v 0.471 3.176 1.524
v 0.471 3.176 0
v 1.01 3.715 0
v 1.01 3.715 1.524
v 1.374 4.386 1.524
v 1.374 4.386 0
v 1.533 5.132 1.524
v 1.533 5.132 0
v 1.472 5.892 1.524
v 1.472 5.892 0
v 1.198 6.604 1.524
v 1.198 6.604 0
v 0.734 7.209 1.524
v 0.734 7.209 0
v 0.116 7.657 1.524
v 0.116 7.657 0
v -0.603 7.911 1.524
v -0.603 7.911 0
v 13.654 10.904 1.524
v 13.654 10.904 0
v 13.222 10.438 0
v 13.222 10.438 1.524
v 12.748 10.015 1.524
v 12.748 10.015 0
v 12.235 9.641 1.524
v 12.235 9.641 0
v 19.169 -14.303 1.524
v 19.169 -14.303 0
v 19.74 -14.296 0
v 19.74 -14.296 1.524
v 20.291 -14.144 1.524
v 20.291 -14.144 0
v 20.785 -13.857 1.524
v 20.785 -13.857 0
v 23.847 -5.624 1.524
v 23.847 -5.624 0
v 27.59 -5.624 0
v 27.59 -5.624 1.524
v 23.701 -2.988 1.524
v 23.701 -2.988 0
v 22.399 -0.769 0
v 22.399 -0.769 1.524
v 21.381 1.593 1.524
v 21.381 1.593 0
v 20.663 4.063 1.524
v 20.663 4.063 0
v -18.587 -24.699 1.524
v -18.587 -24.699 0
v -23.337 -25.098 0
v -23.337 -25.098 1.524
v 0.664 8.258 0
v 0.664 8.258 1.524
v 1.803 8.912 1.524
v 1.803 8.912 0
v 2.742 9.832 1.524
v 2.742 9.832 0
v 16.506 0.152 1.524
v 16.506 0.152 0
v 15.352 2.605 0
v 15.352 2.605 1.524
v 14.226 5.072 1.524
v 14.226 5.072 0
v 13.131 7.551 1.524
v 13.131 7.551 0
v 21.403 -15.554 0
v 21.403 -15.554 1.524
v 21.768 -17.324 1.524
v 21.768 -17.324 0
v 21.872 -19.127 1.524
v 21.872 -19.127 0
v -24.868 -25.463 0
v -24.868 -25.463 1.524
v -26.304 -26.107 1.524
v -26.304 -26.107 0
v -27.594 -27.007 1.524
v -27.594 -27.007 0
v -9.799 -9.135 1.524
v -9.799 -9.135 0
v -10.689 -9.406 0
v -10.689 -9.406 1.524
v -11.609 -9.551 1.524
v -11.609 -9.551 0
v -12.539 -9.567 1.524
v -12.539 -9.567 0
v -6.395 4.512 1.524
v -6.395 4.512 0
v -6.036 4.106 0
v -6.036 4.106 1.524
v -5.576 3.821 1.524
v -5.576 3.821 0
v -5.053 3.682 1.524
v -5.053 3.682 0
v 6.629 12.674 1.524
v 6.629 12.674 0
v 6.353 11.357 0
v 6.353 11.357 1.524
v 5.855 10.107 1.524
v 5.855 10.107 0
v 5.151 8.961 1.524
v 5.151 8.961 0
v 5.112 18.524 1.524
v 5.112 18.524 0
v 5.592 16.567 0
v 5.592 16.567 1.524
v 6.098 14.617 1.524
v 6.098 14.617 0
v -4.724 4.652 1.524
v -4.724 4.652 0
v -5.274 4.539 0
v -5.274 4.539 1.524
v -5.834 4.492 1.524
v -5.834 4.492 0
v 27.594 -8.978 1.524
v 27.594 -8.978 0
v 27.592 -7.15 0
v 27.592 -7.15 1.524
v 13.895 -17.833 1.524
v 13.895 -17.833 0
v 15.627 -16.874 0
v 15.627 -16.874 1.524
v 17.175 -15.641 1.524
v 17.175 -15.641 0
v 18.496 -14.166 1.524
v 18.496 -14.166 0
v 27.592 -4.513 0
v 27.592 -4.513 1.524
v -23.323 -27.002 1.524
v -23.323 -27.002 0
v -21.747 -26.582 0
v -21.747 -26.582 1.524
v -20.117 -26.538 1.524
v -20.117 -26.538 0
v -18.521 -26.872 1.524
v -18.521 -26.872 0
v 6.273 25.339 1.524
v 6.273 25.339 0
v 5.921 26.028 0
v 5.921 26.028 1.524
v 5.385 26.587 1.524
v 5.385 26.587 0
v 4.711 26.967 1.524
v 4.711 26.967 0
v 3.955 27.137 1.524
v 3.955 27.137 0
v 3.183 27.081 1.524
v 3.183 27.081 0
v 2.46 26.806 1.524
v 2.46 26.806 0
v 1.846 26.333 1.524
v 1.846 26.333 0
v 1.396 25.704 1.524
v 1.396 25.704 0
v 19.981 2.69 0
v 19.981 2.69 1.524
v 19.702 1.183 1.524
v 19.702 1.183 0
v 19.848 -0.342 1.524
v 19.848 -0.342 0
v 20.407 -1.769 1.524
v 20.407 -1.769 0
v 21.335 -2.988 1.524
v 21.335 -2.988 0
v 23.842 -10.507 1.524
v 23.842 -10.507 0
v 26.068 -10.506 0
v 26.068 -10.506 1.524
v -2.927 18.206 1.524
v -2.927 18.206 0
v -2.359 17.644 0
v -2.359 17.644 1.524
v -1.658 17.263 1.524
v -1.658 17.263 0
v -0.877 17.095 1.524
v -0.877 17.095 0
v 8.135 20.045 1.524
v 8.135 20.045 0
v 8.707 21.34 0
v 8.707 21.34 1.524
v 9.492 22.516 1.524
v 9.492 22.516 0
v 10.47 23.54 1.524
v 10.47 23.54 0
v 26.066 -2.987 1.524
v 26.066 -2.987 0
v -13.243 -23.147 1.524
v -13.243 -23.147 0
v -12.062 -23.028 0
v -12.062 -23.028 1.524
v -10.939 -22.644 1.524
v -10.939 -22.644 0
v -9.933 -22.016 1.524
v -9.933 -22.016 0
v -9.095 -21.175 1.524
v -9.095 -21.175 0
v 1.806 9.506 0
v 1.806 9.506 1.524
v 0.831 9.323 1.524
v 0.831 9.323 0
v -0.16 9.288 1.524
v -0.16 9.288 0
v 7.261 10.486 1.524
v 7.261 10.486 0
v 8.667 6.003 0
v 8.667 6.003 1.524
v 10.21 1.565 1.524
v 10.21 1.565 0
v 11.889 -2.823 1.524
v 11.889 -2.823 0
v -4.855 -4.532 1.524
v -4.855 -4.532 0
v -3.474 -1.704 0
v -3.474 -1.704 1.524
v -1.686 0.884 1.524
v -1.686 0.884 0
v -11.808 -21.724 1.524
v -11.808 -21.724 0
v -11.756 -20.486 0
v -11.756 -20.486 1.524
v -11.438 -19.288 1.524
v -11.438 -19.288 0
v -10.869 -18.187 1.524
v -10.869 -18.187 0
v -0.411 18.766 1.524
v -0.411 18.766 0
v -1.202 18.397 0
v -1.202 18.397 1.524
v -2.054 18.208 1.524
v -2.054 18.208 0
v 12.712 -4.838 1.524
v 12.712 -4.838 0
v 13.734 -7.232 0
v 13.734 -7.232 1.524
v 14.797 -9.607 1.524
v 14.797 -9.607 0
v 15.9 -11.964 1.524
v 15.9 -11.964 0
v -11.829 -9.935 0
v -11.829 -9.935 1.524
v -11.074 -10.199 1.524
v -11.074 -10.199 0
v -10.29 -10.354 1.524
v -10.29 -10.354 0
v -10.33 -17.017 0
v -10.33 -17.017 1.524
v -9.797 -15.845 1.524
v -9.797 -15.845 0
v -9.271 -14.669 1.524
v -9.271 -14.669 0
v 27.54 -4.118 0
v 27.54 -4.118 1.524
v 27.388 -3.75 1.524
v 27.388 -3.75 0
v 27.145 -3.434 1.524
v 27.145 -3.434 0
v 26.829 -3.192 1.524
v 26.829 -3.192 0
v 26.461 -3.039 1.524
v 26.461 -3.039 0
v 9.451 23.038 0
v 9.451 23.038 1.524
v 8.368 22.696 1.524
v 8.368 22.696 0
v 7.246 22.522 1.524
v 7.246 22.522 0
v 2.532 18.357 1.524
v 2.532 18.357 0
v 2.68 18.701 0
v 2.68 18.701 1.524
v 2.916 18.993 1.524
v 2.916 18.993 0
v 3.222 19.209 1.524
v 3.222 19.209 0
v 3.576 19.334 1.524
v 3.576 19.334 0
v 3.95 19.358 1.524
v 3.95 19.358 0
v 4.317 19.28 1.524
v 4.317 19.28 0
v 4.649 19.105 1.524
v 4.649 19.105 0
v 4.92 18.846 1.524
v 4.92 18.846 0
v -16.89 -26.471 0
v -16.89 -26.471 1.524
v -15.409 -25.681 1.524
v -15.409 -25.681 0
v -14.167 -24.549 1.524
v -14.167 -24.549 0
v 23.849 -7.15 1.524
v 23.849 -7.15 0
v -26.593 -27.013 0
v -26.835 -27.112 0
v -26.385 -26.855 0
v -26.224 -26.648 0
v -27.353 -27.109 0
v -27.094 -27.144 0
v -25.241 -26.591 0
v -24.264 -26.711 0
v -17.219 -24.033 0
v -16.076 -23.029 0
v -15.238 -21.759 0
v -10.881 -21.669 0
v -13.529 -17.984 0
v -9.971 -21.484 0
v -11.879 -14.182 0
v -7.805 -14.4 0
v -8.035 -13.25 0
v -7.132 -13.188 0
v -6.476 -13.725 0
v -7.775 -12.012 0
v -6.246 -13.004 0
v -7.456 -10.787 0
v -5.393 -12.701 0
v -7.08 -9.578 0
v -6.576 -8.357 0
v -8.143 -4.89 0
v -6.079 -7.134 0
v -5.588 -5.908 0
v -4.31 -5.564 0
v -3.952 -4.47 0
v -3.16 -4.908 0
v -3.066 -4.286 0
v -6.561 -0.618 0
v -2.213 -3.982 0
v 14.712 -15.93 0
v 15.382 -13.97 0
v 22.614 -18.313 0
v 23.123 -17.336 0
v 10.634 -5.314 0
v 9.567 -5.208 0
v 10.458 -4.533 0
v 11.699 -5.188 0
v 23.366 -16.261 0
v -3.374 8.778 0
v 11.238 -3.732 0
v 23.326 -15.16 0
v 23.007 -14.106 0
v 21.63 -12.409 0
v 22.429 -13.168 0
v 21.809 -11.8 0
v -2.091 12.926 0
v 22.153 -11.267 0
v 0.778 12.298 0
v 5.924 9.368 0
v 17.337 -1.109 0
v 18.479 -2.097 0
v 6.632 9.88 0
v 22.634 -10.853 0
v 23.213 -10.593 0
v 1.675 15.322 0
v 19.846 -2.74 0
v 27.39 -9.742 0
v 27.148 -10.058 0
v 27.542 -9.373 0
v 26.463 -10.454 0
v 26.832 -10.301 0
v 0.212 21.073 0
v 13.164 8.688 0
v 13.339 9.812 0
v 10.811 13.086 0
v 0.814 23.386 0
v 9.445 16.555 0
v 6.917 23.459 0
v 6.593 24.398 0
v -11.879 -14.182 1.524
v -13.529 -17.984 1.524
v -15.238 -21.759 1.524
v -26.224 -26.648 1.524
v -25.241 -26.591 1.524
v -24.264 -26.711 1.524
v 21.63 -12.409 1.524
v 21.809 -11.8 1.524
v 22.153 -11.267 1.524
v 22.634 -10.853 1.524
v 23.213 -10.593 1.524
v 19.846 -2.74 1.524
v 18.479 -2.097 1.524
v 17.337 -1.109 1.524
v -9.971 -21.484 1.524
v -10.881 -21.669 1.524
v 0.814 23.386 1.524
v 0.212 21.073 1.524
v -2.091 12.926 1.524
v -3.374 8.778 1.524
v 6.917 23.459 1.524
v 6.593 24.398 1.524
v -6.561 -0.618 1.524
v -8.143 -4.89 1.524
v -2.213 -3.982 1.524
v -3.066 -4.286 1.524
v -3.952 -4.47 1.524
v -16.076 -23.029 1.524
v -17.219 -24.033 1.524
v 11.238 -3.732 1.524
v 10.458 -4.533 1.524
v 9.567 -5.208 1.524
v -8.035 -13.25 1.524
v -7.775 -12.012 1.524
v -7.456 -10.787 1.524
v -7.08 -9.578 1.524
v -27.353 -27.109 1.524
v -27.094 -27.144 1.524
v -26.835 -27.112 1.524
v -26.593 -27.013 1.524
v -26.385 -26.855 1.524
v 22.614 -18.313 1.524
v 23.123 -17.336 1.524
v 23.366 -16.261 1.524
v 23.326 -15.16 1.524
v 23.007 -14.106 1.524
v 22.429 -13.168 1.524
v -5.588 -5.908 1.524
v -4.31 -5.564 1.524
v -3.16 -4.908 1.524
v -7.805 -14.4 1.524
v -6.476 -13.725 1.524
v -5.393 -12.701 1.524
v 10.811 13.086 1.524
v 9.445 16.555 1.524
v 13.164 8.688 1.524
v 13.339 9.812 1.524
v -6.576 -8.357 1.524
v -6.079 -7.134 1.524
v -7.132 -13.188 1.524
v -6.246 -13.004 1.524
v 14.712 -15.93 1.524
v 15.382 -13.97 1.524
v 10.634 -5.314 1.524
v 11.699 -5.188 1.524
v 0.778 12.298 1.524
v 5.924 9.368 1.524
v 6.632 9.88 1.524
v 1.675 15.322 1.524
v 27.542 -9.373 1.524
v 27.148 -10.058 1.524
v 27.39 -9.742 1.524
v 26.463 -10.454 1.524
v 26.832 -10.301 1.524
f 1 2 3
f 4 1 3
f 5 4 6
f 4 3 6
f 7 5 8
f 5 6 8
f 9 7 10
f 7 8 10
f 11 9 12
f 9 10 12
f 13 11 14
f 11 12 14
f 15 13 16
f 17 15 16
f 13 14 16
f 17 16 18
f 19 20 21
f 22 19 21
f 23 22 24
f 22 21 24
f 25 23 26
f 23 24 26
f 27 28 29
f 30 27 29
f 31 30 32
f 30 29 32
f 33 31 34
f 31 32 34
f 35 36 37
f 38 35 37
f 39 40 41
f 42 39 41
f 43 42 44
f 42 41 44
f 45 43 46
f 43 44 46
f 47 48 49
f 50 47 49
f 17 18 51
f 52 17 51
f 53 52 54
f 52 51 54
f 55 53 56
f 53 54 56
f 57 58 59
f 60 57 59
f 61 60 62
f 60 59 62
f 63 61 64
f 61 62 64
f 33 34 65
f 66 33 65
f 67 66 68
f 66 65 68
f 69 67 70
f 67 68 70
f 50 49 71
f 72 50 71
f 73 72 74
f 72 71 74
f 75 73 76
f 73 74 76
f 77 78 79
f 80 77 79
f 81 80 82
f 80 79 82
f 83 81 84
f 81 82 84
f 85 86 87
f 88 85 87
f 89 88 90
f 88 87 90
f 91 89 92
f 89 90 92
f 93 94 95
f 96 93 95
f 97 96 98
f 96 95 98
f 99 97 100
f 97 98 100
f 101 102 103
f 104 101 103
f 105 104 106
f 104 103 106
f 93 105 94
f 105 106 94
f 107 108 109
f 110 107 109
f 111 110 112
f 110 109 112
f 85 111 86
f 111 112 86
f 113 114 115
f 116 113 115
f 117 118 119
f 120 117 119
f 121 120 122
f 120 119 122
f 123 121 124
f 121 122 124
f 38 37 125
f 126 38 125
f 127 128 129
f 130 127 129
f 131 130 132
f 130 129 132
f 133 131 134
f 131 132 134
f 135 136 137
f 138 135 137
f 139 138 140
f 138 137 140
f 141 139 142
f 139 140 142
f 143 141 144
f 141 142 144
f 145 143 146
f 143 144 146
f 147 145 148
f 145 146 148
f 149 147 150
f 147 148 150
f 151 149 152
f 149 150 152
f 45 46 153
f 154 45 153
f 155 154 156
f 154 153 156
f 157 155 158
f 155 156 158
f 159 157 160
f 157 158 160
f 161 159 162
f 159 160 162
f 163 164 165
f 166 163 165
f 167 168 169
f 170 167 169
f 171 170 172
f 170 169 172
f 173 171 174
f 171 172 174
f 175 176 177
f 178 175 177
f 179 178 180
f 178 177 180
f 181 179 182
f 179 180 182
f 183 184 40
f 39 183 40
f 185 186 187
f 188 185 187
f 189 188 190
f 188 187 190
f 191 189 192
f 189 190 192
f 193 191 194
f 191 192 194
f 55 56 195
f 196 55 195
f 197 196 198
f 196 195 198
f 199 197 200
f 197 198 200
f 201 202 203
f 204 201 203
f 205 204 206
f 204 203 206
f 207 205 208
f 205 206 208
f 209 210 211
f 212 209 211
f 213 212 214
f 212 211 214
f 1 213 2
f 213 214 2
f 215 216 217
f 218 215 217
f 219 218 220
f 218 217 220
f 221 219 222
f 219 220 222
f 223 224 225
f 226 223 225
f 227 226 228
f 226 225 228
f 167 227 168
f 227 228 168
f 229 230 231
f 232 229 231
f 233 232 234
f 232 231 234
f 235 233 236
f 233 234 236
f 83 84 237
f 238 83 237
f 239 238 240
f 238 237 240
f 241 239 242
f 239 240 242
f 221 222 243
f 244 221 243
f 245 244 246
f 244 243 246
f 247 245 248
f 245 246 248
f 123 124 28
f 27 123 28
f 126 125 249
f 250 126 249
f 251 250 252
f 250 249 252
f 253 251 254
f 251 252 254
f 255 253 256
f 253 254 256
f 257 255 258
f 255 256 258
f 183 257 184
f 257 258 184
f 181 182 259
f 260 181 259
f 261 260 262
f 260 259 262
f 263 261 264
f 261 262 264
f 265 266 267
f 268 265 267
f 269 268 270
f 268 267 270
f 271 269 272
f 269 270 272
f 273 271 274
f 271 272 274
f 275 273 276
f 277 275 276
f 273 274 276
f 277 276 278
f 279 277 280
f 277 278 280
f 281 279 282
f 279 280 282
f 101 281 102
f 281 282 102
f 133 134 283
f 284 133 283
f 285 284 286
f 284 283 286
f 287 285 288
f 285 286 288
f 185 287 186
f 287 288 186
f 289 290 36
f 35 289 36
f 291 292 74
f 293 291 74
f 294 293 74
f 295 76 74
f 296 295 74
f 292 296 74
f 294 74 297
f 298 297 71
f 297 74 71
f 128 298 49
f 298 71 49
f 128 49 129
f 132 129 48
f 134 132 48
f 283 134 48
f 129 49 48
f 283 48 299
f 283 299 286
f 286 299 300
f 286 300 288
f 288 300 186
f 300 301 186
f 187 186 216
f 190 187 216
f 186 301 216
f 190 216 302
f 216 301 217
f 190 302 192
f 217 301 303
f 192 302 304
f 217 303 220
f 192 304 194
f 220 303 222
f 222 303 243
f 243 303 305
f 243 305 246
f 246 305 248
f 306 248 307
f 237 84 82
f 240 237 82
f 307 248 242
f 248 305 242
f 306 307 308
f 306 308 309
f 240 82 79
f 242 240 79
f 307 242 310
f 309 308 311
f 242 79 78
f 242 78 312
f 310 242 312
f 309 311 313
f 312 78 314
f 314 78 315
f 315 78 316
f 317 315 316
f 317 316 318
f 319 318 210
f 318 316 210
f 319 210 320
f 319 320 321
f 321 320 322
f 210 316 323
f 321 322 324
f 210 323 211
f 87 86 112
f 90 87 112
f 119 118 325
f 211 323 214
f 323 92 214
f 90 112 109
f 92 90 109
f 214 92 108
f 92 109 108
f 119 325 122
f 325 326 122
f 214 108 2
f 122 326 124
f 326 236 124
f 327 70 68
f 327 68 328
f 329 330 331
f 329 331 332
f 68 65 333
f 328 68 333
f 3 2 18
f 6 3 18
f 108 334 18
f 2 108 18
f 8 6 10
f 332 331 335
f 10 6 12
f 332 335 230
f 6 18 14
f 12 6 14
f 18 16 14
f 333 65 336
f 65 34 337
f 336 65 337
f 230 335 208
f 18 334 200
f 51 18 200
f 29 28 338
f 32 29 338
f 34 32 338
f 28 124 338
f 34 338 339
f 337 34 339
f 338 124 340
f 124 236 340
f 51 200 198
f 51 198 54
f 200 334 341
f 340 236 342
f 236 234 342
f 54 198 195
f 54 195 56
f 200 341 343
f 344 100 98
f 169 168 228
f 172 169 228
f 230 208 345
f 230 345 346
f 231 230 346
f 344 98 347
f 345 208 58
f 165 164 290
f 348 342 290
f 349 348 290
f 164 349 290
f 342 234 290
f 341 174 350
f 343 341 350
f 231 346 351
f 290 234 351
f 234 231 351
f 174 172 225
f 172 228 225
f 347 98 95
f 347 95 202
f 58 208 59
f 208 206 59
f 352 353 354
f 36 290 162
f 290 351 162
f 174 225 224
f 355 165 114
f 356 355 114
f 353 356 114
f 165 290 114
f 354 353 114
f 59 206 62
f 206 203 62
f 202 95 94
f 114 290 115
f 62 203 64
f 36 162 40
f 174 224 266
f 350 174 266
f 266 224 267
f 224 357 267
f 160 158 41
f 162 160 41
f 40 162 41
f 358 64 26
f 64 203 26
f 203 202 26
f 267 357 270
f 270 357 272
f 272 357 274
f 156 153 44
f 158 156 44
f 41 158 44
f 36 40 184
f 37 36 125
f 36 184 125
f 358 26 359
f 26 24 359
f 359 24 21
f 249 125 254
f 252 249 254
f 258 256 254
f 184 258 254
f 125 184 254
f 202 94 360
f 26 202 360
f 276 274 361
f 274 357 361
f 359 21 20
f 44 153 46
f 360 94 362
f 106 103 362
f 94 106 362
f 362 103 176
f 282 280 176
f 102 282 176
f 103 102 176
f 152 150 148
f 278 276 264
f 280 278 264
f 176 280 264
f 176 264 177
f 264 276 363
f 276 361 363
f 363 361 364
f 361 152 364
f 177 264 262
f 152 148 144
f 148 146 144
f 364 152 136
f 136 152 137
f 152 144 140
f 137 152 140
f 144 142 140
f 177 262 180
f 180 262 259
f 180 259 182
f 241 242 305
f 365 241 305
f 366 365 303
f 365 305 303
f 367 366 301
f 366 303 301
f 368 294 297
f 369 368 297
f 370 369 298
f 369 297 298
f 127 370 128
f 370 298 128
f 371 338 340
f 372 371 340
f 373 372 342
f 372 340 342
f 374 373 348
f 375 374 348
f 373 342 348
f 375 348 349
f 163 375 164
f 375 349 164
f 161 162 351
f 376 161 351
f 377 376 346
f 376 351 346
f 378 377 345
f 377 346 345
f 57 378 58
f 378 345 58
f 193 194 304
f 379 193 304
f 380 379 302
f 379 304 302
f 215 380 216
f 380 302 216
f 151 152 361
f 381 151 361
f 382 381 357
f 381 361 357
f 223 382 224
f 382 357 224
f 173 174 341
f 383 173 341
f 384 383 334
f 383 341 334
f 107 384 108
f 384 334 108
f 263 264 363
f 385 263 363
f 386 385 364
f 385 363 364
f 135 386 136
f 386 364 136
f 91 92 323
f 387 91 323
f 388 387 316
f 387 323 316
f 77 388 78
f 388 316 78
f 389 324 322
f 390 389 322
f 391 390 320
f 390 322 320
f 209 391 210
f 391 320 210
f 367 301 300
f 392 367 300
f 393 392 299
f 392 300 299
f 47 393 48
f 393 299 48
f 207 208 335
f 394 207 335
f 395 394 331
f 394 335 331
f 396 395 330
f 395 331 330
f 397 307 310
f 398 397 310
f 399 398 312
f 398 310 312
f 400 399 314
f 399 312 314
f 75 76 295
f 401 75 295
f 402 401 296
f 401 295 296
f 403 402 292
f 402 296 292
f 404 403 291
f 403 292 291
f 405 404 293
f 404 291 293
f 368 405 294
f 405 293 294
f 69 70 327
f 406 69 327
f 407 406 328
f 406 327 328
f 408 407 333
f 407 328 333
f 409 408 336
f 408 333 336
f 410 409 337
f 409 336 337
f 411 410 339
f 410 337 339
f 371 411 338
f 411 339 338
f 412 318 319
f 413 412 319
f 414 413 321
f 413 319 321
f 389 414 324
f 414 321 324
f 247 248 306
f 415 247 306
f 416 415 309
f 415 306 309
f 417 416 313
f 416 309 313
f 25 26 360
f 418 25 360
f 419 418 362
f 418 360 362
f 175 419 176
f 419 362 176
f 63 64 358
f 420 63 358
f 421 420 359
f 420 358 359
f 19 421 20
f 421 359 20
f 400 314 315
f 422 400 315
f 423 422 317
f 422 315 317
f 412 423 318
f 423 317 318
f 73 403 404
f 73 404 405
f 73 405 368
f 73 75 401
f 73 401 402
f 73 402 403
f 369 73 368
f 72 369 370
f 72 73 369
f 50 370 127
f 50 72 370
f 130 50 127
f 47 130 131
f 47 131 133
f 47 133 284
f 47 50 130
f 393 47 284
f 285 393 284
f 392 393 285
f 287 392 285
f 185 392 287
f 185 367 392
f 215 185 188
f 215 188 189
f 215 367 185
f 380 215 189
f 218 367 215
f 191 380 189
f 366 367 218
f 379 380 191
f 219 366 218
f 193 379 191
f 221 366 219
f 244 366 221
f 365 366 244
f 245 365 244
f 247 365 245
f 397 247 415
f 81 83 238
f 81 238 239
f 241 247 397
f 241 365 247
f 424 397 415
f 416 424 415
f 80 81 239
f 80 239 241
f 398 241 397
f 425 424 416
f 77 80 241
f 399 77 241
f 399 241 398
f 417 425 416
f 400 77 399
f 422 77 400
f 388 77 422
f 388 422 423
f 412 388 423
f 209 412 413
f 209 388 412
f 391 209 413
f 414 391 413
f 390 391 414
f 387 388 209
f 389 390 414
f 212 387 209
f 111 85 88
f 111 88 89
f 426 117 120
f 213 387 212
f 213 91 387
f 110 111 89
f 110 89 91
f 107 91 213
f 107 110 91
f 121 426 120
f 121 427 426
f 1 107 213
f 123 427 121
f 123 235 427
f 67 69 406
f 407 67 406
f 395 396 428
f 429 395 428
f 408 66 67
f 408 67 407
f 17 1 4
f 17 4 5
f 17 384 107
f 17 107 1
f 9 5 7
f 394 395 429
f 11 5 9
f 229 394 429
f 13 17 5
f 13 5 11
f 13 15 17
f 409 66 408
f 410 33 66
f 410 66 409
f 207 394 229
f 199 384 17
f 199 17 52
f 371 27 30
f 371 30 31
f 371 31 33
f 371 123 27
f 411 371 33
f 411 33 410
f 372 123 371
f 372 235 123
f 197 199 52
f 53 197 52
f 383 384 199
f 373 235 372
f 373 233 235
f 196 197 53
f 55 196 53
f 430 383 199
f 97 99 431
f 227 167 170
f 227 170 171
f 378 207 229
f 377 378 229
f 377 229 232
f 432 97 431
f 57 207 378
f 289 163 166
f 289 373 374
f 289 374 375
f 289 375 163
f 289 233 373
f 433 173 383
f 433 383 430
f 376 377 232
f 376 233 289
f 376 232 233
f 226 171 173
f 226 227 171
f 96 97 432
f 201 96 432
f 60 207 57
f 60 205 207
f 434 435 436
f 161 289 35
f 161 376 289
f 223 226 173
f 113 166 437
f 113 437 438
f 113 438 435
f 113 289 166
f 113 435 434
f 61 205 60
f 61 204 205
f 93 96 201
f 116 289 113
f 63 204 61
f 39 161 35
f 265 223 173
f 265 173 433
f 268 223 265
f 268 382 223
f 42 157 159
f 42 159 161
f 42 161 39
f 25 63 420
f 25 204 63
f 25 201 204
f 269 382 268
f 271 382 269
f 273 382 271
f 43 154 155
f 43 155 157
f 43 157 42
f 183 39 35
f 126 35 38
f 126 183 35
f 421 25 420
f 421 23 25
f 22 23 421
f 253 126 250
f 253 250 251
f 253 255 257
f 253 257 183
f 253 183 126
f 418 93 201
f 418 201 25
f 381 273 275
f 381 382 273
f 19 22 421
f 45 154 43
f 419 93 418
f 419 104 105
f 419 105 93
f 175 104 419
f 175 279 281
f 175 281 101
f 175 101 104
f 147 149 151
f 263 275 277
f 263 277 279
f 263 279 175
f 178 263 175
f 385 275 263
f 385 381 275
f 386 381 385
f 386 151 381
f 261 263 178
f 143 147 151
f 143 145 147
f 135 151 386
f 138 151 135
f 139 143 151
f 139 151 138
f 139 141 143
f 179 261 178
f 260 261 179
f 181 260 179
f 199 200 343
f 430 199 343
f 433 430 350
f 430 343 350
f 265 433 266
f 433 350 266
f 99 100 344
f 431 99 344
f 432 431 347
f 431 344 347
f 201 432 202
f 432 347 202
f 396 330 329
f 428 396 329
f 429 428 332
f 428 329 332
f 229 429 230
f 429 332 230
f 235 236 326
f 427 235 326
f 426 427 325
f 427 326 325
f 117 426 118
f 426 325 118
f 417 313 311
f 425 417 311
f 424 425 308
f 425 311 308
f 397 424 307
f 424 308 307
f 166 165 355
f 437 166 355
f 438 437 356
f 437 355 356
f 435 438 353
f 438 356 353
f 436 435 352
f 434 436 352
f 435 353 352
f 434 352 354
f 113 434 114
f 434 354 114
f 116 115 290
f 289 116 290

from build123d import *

# Parameters (mm, degrees)
BOSS_EXTRUDE1_DEPTH = 1.524


with BuildPart() as part:
    # Sketch1 → Boss-Extrude1 (new body)
    with BuildSketch(Plane.XY):
        with BuildLine():
            Line((23.841868496, -10.506949106), (26.068199276, -10.505871764))
            ThreePointArc((26.068199276, -10.505871764), (27.147715357, -10.058146709), (27.594179967, -8.978108726))
            Line((27.594179967, -8.978108726), (27.592193648, -7.149905424))
            Line((27.592193648, -7.149905424), (23.848771017, -7.149905424))
            Line((23.848771017, -7.149905424), (23.846783681, -5.623924224))
            Line((23.846783681, -5.623924224), (27.590206312, -5.623924224))
            Line((27.590206312, -5.623924224), (27.592193648, -4.513216426))
            ThreePointArc((27.592193648, -4.513216426), (27.145243923, -3.434184592), (26.06621194, -2.987235226))
            Line((26.06621194, -2.987235226), (23.700742448, -2.987731933))
            ThreePointArc((23.700742448, -2.987731933), (21.853763211, 0.396085968), (20.662942507, 4.062624108))
            ThreePointArc((20.662942507, 4.062624108), (19.722128306, 0.415432016), (21.335272956, -2.98822864))
            ThreePointArc((21.335272956, -2.98822864), (18.47901593, -2.097405096), (16.50646059, 0.152216254))
            ThreePointArc((16.50646059, 0.152216254), (14.785372428, 3.836585951), (13.130721746, 7.551267048))
            ThreePointArc((13.130721746, 7.551267048), (13.233622121, 9.252516805), (13.653748602, 10.904283424))
            ThreePointArc((13.653748602, 10.904283424), (12.99040582, 10.220702416), (12.234885694, 9.64061968))
            ThreePointArc((12.234885694, 9.64061968), (10.12080113, 14.817724102), (8.135197678, 20.045452354))
            ThreePointArc((8.135197678, 20.045452354), (9.07398957, 21.945137091), (10.469509483, 23.539708032))
            ThreePointArc((10.469509483, 23.539708032), (8.915709374, 22.846825686), (7.245789765, 22.521634627))
            ThreePointArc((7.245789765, 22.521634627), (6.75481808, 23.928653676), (6.273116214, 25.338873202))
            ThreePointArc((6.273116214, 25.338873202), (3.955147053, 27.136861073), (1.395527385, 25.703651887))
            ThreePointArc((1.395527385, 25.703651887), (0.515712233, 22.228862241), (-0.41145202, 18.766405854))
            ThreePointArc((-0.41145202, 18.766405854), (-1.622932108, 18.279372053), (-2.926572326, 18.205832225))
            ThreePointArc((-2.926572326, 18.205832225), (-2.022011476, 17.428802856), (-0.877304936, 17.094659314))
            ThreePointArc((-0.877304936, 17.094659314), (-2.723720739, 10.849649399), (-4.724433819, 4.652347782))
            ThreePointArc((-4.724433819, 4.652347782), (-5.553363062, 4.507568674), (-6.394830907, 4.511636389))
            ThreePointArc((-6.394830907, 4.511636389), (-5.816780919, 3.946754251), (-5.053213137, 3.681805461))
            ThreePointArc((-5.053213137, 3.681805461), (-7.342468518, -2.757262031), (-9.798511581, -9.134575953))
            ThreePointArc((-9.798511581, -9.134575953), (-11.146241899, -9.494732073), (-12.539374775, -9.567328436))
            ThreePointArc((-12.539374775, -9.567328436), (-11.456387472, -10.079926299), (-10.289959872, -10.353905718))
            ThreePointArc((-10.289959872, -10.353905718), (-12.696378355, -16.085978869), (-15.23781775, -21.759478522))
            ThreePointArc((-15.23781775, -21.759478522), (-16.613838722, -23.569338635), (-18.587158788, -24.698513227))
            Line((-18.587158788, -24.698513227), (-23.337428896, -25.097915233))
            ThreePointArc((-23.337428896, -25.097915233), (-25.600837555, -25.751570827), (-27.594180508, -27.00730498))
            ThreePointArc((-27.594180508, -27.00730498), (-26.834901197, -27.111562643), (-26.224288347, -26.648392395))
            ThreePointArc((-26.224288347, -26.648392395), (-24.749884123, -26.629116362), (-23.323298678, -27.002068563))
            ThreePointArc((-23.323298678, -27.002068563), (-20.933638176, -26.512638906), (-18.521050739, -26.872417397))
            ThreePointArc((-18.521050739, -26.872417397), (-15.408520041, -25.680590506), (-13.243289855, -23.146803434))
            ThreePointArc((-13.243289855, -23.146803434), (-10.939299547, -22.644411883), (-9.09502436, -21.174916172))
            ThreePointArc((-9.09502436, -21.174916172), (-10.422629625, -21.592521303), (-11.808160337, -21.723801278))
            ThreePointArc((-11.808160337, -21.723801278), (-11.629423676, -19.87808238), (-10.869125888, -18.186759728))
            ThreePointArc((-10.869125888, -18.186759728), (-10.06288258, -16.43139287), (-9.27114661, -14.669435086))
            ThreePointArc((-9.27114661, -14.669435086), (-7.116039845, -14.110620335), (-5.392996781, -12.70069775))
            ThreePointArc((-5.392996781, -12.70069775), (-6.685933272, -13.1111928), (-8.035353311, -13.249960648))
            ThreePointArc((-8.035353311, -13.249960648), (-7.62253261, -11.397230513), (-7.080348792, -9.578146516))
            ThreePointArc((-7.080348792, -9.578146516), (-6.326640496, -7.746057309), (-5.588458433, -5.90765738))
            ThreePointArc((-5.588458433, -5.90765738), (-3.713864907, -5.272651789), (-2.213006184, -3.982397519))
            ThreePointArc((-2.213006184, -3.982397519), (-3.505942675, -4.392892568), (-4.855362713, -4.531660417))
            ThreePointArc((-4.855362713, -4.531660417), (-2.628642535, -0.376345962), (0.470998143, 3.175716628))
            ThreePointArc((0.470998143, 3.175716628), (1.472273464, 5.892268907), (-0.603369584, 7.910662945))
            ThreePointArc((-0.603369584, 7.910662945), (1.254291962, 8.549045158), (2.741948703, 9.831743755))
            ThreePointArc((2.741948703, 9.831743755), (1.32183158, 9.396106351), (-0.159629899, 9.287550016))
            ThreePointArc((-0.159629899, 9.287550016), (1.231844903, 13.808566094), (2.531714491, 18.356766568))
            ThreePointArc((2.531714491, 18.356766568), (3.762130664, 19.35895724), (5.111523048, 18.523822342))
            ThreePointArc((5.111523048, 18.523822342), (5.841359999, 15.591441368), (6.629061504, 12.674071577))
            ThreePointArc((6.629061504, 12.674071577), (6.131201427, 10.721467417), (5.150999348, 8.960861967))
            ThreePointArc((5.150999348, 8.960861967), (6.286769778, 9.611384591), (7.260885888, 10.485599644))
            ThreePointArc((7.260885888, 10.485599644), (9.421271832, 3.777976775), (11.888720554, -2.82286929))
            ThreePointArc((11.888720554, -2.82286929), (10.862715973, -4.146724537), (9.567099571, -5.208165187))
            ThreePointArc((9.567099571, -5.208165187), (11.169841142, -5.279612135), (12.712295724, -4.838342295))
            ThreePointArc((12.712295724, -4.838342295), (14.260423663, -8.421579982), (15.8996033, -11.964090751))
            ThreePointArc((15.8996033, -11.964090751), (15.065930684, -14.956168746), (13.895117254, -17.833100562))
            ThreePointArc((13.895117254, -17.833100562), (16.426590022, -16.289885632), (18.495512952, -14.166345049))
            Line((18.495512952, -14.166345049), (19.168549545, -14.30256589))
            ThreePointArc((19.168549545, -14.30256589), (20.020311576, -14.238117294), (20.784861991, -13.857177873))
            ThreePointArc((20.784861991, -13.857177873), (21.617673082, -16.43239432), (21.871894835, -19.126960215))
            ThreePointArc((21.871894835, -19.126960215), (23.381897517, -15.709462317), (21.630181539, -12.409327303))
            ThreePointArc((21.630181539, -12.409327303), (22.378657332, -11.042665903), (23.841868496, -10.506949106))
        make_face()
    extrude(amount=BOSS_EXTRUDE1_DEPTH)


solid = part.part
